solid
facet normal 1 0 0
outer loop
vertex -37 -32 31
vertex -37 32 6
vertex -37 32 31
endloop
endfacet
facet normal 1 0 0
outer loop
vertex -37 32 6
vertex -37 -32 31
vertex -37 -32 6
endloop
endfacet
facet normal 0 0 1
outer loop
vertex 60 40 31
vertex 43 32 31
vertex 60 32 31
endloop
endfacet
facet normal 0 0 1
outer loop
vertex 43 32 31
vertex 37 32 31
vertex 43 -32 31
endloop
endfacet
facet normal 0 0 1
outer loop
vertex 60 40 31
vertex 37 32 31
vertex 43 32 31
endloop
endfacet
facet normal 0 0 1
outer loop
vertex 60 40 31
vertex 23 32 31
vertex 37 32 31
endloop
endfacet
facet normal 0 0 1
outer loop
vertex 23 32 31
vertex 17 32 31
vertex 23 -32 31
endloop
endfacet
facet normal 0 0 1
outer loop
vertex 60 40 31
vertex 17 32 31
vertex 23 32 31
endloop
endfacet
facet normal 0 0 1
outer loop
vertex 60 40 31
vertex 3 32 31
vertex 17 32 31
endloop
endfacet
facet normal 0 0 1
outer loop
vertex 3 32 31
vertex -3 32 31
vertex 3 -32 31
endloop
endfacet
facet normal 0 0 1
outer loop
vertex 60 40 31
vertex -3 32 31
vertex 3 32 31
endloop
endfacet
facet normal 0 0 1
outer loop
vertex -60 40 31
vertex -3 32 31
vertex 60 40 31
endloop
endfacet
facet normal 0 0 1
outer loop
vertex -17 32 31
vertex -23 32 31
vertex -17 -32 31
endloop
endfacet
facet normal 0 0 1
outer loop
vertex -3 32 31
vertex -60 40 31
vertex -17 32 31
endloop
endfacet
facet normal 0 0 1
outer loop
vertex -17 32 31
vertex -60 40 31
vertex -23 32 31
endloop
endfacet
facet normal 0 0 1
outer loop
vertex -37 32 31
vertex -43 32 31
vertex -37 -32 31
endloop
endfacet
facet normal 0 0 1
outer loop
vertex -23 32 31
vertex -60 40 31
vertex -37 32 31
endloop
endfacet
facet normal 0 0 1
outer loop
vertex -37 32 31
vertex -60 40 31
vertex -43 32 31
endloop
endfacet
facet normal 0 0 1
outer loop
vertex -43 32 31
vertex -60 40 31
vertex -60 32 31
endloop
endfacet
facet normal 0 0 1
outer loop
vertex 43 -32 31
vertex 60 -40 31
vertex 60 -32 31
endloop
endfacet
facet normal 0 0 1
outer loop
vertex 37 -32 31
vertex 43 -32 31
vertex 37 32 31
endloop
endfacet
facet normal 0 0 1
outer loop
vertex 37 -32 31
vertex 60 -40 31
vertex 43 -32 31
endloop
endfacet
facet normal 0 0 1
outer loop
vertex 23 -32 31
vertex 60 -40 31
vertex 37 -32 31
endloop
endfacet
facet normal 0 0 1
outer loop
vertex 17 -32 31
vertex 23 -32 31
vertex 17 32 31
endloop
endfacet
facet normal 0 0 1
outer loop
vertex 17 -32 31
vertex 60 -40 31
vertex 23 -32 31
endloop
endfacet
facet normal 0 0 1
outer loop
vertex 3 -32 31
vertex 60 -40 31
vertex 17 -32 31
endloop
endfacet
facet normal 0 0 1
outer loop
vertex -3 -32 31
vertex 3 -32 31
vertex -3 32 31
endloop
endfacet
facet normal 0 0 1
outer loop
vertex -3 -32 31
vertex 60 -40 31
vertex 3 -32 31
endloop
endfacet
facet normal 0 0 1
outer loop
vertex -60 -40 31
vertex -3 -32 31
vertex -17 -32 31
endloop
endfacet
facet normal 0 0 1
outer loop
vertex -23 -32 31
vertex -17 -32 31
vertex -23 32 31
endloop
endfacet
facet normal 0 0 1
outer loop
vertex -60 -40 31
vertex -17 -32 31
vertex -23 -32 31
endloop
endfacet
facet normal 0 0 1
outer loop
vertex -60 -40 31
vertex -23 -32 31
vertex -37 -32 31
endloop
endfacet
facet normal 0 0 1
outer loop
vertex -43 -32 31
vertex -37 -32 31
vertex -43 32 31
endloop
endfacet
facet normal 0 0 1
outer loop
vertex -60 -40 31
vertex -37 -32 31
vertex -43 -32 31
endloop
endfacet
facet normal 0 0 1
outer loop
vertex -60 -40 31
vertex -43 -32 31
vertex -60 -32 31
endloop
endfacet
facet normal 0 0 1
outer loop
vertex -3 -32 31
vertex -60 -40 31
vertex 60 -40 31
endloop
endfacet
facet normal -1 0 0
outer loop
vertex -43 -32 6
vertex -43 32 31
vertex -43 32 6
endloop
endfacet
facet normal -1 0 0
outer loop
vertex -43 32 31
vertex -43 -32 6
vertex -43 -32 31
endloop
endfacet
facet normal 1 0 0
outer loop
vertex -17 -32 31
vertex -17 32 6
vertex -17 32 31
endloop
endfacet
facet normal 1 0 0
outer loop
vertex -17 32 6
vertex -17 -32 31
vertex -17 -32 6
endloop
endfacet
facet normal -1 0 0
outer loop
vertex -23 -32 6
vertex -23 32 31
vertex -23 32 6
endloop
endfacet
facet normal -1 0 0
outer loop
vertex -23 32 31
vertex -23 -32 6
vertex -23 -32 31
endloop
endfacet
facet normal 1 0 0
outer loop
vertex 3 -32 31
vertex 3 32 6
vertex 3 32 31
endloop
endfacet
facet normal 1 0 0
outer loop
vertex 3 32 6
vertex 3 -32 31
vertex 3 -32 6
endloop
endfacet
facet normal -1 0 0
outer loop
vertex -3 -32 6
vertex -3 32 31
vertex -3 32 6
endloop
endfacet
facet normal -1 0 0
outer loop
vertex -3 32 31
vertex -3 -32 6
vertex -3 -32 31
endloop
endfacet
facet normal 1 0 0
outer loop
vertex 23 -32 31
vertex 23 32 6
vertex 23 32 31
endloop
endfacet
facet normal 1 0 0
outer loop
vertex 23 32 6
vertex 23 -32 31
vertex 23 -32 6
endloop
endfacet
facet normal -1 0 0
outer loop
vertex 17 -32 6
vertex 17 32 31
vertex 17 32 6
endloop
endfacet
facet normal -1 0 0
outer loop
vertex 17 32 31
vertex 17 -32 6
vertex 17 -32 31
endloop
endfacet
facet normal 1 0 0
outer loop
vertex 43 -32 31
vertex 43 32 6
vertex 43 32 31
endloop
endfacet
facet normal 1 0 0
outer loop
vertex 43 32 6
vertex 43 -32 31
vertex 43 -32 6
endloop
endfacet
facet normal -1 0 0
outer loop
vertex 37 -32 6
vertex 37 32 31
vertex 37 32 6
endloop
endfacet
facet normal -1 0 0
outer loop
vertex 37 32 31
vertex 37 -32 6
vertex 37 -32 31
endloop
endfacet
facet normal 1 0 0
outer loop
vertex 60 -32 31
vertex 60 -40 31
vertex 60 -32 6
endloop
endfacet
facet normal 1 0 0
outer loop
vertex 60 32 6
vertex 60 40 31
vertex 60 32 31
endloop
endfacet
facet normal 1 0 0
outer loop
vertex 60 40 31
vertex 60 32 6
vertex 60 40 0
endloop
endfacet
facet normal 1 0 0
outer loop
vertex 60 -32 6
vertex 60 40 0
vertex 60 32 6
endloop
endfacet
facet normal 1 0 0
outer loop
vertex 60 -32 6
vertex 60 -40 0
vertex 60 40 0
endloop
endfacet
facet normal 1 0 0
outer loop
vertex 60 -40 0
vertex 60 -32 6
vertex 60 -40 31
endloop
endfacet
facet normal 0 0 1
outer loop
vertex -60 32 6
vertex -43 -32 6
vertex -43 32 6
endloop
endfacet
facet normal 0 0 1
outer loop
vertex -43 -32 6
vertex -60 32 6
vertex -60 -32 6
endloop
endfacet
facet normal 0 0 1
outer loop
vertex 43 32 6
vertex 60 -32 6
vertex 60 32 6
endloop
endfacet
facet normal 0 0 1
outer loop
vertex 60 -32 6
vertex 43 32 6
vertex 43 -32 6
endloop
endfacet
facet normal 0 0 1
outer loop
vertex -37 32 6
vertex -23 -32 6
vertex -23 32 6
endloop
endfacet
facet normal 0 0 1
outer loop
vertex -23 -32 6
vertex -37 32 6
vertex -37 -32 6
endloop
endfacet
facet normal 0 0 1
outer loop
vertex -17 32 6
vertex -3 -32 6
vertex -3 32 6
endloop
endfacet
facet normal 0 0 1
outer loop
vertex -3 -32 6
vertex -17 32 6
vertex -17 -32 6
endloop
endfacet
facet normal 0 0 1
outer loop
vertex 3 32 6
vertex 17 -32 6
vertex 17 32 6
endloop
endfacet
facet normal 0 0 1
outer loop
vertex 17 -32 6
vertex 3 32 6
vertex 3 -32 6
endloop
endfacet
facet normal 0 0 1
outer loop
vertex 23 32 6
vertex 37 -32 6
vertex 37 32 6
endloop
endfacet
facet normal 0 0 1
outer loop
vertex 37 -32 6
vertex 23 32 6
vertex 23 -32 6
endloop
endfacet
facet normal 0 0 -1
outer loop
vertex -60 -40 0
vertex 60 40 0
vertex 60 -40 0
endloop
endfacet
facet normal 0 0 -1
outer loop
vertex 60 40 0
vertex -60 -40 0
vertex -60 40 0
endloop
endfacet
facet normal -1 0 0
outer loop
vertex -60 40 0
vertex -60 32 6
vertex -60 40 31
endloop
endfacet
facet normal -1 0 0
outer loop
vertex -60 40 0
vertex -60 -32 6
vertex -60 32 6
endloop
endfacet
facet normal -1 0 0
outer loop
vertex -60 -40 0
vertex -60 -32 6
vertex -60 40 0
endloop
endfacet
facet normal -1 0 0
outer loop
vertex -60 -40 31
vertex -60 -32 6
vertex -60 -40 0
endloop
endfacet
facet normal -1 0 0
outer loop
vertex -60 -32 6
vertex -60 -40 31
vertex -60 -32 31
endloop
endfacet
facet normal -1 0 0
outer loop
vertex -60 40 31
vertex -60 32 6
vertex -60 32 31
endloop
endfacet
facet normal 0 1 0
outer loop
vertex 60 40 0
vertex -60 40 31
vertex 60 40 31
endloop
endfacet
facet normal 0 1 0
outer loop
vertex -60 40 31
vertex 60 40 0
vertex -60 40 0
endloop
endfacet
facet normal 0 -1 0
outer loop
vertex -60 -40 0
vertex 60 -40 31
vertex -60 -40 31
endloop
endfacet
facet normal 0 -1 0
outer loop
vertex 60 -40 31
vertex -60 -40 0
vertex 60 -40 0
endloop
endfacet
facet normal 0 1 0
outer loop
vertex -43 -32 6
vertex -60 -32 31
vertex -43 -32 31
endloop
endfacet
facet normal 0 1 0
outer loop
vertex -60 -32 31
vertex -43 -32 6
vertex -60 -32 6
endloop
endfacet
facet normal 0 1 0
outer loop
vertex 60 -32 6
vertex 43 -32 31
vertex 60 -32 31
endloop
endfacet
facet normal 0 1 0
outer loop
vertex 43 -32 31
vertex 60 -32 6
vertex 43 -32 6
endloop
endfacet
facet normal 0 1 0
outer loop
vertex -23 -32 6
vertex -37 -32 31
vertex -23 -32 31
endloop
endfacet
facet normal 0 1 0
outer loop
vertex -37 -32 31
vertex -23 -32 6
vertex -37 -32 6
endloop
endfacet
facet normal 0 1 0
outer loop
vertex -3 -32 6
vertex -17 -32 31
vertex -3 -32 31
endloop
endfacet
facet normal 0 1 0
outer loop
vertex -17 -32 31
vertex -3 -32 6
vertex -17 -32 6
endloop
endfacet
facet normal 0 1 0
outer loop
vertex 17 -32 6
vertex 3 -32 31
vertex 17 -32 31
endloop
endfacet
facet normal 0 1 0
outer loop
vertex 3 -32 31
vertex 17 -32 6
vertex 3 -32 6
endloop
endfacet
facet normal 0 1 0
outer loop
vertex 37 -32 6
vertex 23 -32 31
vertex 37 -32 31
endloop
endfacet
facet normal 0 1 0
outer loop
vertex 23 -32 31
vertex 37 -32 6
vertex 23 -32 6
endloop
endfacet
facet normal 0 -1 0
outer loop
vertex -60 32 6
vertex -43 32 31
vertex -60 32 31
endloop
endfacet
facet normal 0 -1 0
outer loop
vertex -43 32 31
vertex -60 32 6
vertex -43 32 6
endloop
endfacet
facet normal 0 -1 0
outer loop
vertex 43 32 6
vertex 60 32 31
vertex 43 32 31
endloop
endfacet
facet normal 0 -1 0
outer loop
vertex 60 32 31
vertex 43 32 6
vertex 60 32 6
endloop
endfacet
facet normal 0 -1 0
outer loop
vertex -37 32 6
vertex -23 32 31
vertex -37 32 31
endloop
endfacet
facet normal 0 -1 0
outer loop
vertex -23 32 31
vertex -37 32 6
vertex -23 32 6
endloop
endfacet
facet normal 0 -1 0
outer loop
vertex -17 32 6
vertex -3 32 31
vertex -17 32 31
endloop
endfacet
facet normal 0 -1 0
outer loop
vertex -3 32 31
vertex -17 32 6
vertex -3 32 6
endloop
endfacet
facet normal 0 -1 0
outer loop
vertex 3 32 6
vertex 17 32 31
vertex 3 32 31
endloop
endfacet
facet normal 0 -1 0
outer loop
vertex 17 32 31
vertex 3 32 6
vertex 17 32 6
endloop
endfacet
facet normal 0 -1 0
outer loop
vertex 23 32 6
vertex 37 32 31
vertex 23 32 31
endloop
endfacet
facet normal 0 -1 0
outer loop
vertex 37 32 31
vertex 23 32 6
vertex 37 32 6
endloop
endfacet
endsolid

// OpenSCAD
$fn = 32;

// ----------------------------------------------------------------------
// Rib frame 120 x 80 x 31
// 5 ribs at 20 mm pitch
// ----------------------------------------------------------------------

// --- parameters (mm) ---
frame = [120, 80, 6];  // base plate size (x, y, z)
rail_w = 8;            // side rail width
ribs = 5;              // number of ribs
rib_t = 6;             // rib thickness
rib_h = 25;            // rib height above the base plate
pitch = 20;            // pitch between rib centres

// --- derived feature positions (mm) ---
span = (ribs - 1) * pitch;          // = 80   distance between the outer ribs
origin_x = -span / 2;               // = -40   X of the first rib
rib_len = frame[1] - 2 * rail_w + 2;  // = 66   rib length, 1 mm into each rail
feature_centers = [
  [origin_x + 0 * pitch, 0],
  [origin_x + 1 * pitch, 0],
  [origin_x + 2 * pitch, 0],
  [origin_x + 3 * pitch, 0],
  [origin_x + 4 * pitch, 0]
];   // rib centre line, drives the rib loop

// base plate, two side rails, then the ribs read straight off feature_centers
union() {
  translate([-frame[0] / 2, -frame[1] / 2, 0]) cube(frame);
  translate([-frame[0] / 2, -frame[1] / 2, 0]) cube([frame[0], rail_w, frame[2] + rib_h]);
  translate([-frame[0] / 2, frame[1] / 2 - rail_w, 0]) cube([frame[0], rail_w, frame[2] + rib_h]);
  for (centre = feature_centers)
    translate([centre[0] - rib_t / 2, centre[1] - rib_len / 2, frame[2] - 1])
      cube([rib_t, rib_len, rib_h + 1]);
}
